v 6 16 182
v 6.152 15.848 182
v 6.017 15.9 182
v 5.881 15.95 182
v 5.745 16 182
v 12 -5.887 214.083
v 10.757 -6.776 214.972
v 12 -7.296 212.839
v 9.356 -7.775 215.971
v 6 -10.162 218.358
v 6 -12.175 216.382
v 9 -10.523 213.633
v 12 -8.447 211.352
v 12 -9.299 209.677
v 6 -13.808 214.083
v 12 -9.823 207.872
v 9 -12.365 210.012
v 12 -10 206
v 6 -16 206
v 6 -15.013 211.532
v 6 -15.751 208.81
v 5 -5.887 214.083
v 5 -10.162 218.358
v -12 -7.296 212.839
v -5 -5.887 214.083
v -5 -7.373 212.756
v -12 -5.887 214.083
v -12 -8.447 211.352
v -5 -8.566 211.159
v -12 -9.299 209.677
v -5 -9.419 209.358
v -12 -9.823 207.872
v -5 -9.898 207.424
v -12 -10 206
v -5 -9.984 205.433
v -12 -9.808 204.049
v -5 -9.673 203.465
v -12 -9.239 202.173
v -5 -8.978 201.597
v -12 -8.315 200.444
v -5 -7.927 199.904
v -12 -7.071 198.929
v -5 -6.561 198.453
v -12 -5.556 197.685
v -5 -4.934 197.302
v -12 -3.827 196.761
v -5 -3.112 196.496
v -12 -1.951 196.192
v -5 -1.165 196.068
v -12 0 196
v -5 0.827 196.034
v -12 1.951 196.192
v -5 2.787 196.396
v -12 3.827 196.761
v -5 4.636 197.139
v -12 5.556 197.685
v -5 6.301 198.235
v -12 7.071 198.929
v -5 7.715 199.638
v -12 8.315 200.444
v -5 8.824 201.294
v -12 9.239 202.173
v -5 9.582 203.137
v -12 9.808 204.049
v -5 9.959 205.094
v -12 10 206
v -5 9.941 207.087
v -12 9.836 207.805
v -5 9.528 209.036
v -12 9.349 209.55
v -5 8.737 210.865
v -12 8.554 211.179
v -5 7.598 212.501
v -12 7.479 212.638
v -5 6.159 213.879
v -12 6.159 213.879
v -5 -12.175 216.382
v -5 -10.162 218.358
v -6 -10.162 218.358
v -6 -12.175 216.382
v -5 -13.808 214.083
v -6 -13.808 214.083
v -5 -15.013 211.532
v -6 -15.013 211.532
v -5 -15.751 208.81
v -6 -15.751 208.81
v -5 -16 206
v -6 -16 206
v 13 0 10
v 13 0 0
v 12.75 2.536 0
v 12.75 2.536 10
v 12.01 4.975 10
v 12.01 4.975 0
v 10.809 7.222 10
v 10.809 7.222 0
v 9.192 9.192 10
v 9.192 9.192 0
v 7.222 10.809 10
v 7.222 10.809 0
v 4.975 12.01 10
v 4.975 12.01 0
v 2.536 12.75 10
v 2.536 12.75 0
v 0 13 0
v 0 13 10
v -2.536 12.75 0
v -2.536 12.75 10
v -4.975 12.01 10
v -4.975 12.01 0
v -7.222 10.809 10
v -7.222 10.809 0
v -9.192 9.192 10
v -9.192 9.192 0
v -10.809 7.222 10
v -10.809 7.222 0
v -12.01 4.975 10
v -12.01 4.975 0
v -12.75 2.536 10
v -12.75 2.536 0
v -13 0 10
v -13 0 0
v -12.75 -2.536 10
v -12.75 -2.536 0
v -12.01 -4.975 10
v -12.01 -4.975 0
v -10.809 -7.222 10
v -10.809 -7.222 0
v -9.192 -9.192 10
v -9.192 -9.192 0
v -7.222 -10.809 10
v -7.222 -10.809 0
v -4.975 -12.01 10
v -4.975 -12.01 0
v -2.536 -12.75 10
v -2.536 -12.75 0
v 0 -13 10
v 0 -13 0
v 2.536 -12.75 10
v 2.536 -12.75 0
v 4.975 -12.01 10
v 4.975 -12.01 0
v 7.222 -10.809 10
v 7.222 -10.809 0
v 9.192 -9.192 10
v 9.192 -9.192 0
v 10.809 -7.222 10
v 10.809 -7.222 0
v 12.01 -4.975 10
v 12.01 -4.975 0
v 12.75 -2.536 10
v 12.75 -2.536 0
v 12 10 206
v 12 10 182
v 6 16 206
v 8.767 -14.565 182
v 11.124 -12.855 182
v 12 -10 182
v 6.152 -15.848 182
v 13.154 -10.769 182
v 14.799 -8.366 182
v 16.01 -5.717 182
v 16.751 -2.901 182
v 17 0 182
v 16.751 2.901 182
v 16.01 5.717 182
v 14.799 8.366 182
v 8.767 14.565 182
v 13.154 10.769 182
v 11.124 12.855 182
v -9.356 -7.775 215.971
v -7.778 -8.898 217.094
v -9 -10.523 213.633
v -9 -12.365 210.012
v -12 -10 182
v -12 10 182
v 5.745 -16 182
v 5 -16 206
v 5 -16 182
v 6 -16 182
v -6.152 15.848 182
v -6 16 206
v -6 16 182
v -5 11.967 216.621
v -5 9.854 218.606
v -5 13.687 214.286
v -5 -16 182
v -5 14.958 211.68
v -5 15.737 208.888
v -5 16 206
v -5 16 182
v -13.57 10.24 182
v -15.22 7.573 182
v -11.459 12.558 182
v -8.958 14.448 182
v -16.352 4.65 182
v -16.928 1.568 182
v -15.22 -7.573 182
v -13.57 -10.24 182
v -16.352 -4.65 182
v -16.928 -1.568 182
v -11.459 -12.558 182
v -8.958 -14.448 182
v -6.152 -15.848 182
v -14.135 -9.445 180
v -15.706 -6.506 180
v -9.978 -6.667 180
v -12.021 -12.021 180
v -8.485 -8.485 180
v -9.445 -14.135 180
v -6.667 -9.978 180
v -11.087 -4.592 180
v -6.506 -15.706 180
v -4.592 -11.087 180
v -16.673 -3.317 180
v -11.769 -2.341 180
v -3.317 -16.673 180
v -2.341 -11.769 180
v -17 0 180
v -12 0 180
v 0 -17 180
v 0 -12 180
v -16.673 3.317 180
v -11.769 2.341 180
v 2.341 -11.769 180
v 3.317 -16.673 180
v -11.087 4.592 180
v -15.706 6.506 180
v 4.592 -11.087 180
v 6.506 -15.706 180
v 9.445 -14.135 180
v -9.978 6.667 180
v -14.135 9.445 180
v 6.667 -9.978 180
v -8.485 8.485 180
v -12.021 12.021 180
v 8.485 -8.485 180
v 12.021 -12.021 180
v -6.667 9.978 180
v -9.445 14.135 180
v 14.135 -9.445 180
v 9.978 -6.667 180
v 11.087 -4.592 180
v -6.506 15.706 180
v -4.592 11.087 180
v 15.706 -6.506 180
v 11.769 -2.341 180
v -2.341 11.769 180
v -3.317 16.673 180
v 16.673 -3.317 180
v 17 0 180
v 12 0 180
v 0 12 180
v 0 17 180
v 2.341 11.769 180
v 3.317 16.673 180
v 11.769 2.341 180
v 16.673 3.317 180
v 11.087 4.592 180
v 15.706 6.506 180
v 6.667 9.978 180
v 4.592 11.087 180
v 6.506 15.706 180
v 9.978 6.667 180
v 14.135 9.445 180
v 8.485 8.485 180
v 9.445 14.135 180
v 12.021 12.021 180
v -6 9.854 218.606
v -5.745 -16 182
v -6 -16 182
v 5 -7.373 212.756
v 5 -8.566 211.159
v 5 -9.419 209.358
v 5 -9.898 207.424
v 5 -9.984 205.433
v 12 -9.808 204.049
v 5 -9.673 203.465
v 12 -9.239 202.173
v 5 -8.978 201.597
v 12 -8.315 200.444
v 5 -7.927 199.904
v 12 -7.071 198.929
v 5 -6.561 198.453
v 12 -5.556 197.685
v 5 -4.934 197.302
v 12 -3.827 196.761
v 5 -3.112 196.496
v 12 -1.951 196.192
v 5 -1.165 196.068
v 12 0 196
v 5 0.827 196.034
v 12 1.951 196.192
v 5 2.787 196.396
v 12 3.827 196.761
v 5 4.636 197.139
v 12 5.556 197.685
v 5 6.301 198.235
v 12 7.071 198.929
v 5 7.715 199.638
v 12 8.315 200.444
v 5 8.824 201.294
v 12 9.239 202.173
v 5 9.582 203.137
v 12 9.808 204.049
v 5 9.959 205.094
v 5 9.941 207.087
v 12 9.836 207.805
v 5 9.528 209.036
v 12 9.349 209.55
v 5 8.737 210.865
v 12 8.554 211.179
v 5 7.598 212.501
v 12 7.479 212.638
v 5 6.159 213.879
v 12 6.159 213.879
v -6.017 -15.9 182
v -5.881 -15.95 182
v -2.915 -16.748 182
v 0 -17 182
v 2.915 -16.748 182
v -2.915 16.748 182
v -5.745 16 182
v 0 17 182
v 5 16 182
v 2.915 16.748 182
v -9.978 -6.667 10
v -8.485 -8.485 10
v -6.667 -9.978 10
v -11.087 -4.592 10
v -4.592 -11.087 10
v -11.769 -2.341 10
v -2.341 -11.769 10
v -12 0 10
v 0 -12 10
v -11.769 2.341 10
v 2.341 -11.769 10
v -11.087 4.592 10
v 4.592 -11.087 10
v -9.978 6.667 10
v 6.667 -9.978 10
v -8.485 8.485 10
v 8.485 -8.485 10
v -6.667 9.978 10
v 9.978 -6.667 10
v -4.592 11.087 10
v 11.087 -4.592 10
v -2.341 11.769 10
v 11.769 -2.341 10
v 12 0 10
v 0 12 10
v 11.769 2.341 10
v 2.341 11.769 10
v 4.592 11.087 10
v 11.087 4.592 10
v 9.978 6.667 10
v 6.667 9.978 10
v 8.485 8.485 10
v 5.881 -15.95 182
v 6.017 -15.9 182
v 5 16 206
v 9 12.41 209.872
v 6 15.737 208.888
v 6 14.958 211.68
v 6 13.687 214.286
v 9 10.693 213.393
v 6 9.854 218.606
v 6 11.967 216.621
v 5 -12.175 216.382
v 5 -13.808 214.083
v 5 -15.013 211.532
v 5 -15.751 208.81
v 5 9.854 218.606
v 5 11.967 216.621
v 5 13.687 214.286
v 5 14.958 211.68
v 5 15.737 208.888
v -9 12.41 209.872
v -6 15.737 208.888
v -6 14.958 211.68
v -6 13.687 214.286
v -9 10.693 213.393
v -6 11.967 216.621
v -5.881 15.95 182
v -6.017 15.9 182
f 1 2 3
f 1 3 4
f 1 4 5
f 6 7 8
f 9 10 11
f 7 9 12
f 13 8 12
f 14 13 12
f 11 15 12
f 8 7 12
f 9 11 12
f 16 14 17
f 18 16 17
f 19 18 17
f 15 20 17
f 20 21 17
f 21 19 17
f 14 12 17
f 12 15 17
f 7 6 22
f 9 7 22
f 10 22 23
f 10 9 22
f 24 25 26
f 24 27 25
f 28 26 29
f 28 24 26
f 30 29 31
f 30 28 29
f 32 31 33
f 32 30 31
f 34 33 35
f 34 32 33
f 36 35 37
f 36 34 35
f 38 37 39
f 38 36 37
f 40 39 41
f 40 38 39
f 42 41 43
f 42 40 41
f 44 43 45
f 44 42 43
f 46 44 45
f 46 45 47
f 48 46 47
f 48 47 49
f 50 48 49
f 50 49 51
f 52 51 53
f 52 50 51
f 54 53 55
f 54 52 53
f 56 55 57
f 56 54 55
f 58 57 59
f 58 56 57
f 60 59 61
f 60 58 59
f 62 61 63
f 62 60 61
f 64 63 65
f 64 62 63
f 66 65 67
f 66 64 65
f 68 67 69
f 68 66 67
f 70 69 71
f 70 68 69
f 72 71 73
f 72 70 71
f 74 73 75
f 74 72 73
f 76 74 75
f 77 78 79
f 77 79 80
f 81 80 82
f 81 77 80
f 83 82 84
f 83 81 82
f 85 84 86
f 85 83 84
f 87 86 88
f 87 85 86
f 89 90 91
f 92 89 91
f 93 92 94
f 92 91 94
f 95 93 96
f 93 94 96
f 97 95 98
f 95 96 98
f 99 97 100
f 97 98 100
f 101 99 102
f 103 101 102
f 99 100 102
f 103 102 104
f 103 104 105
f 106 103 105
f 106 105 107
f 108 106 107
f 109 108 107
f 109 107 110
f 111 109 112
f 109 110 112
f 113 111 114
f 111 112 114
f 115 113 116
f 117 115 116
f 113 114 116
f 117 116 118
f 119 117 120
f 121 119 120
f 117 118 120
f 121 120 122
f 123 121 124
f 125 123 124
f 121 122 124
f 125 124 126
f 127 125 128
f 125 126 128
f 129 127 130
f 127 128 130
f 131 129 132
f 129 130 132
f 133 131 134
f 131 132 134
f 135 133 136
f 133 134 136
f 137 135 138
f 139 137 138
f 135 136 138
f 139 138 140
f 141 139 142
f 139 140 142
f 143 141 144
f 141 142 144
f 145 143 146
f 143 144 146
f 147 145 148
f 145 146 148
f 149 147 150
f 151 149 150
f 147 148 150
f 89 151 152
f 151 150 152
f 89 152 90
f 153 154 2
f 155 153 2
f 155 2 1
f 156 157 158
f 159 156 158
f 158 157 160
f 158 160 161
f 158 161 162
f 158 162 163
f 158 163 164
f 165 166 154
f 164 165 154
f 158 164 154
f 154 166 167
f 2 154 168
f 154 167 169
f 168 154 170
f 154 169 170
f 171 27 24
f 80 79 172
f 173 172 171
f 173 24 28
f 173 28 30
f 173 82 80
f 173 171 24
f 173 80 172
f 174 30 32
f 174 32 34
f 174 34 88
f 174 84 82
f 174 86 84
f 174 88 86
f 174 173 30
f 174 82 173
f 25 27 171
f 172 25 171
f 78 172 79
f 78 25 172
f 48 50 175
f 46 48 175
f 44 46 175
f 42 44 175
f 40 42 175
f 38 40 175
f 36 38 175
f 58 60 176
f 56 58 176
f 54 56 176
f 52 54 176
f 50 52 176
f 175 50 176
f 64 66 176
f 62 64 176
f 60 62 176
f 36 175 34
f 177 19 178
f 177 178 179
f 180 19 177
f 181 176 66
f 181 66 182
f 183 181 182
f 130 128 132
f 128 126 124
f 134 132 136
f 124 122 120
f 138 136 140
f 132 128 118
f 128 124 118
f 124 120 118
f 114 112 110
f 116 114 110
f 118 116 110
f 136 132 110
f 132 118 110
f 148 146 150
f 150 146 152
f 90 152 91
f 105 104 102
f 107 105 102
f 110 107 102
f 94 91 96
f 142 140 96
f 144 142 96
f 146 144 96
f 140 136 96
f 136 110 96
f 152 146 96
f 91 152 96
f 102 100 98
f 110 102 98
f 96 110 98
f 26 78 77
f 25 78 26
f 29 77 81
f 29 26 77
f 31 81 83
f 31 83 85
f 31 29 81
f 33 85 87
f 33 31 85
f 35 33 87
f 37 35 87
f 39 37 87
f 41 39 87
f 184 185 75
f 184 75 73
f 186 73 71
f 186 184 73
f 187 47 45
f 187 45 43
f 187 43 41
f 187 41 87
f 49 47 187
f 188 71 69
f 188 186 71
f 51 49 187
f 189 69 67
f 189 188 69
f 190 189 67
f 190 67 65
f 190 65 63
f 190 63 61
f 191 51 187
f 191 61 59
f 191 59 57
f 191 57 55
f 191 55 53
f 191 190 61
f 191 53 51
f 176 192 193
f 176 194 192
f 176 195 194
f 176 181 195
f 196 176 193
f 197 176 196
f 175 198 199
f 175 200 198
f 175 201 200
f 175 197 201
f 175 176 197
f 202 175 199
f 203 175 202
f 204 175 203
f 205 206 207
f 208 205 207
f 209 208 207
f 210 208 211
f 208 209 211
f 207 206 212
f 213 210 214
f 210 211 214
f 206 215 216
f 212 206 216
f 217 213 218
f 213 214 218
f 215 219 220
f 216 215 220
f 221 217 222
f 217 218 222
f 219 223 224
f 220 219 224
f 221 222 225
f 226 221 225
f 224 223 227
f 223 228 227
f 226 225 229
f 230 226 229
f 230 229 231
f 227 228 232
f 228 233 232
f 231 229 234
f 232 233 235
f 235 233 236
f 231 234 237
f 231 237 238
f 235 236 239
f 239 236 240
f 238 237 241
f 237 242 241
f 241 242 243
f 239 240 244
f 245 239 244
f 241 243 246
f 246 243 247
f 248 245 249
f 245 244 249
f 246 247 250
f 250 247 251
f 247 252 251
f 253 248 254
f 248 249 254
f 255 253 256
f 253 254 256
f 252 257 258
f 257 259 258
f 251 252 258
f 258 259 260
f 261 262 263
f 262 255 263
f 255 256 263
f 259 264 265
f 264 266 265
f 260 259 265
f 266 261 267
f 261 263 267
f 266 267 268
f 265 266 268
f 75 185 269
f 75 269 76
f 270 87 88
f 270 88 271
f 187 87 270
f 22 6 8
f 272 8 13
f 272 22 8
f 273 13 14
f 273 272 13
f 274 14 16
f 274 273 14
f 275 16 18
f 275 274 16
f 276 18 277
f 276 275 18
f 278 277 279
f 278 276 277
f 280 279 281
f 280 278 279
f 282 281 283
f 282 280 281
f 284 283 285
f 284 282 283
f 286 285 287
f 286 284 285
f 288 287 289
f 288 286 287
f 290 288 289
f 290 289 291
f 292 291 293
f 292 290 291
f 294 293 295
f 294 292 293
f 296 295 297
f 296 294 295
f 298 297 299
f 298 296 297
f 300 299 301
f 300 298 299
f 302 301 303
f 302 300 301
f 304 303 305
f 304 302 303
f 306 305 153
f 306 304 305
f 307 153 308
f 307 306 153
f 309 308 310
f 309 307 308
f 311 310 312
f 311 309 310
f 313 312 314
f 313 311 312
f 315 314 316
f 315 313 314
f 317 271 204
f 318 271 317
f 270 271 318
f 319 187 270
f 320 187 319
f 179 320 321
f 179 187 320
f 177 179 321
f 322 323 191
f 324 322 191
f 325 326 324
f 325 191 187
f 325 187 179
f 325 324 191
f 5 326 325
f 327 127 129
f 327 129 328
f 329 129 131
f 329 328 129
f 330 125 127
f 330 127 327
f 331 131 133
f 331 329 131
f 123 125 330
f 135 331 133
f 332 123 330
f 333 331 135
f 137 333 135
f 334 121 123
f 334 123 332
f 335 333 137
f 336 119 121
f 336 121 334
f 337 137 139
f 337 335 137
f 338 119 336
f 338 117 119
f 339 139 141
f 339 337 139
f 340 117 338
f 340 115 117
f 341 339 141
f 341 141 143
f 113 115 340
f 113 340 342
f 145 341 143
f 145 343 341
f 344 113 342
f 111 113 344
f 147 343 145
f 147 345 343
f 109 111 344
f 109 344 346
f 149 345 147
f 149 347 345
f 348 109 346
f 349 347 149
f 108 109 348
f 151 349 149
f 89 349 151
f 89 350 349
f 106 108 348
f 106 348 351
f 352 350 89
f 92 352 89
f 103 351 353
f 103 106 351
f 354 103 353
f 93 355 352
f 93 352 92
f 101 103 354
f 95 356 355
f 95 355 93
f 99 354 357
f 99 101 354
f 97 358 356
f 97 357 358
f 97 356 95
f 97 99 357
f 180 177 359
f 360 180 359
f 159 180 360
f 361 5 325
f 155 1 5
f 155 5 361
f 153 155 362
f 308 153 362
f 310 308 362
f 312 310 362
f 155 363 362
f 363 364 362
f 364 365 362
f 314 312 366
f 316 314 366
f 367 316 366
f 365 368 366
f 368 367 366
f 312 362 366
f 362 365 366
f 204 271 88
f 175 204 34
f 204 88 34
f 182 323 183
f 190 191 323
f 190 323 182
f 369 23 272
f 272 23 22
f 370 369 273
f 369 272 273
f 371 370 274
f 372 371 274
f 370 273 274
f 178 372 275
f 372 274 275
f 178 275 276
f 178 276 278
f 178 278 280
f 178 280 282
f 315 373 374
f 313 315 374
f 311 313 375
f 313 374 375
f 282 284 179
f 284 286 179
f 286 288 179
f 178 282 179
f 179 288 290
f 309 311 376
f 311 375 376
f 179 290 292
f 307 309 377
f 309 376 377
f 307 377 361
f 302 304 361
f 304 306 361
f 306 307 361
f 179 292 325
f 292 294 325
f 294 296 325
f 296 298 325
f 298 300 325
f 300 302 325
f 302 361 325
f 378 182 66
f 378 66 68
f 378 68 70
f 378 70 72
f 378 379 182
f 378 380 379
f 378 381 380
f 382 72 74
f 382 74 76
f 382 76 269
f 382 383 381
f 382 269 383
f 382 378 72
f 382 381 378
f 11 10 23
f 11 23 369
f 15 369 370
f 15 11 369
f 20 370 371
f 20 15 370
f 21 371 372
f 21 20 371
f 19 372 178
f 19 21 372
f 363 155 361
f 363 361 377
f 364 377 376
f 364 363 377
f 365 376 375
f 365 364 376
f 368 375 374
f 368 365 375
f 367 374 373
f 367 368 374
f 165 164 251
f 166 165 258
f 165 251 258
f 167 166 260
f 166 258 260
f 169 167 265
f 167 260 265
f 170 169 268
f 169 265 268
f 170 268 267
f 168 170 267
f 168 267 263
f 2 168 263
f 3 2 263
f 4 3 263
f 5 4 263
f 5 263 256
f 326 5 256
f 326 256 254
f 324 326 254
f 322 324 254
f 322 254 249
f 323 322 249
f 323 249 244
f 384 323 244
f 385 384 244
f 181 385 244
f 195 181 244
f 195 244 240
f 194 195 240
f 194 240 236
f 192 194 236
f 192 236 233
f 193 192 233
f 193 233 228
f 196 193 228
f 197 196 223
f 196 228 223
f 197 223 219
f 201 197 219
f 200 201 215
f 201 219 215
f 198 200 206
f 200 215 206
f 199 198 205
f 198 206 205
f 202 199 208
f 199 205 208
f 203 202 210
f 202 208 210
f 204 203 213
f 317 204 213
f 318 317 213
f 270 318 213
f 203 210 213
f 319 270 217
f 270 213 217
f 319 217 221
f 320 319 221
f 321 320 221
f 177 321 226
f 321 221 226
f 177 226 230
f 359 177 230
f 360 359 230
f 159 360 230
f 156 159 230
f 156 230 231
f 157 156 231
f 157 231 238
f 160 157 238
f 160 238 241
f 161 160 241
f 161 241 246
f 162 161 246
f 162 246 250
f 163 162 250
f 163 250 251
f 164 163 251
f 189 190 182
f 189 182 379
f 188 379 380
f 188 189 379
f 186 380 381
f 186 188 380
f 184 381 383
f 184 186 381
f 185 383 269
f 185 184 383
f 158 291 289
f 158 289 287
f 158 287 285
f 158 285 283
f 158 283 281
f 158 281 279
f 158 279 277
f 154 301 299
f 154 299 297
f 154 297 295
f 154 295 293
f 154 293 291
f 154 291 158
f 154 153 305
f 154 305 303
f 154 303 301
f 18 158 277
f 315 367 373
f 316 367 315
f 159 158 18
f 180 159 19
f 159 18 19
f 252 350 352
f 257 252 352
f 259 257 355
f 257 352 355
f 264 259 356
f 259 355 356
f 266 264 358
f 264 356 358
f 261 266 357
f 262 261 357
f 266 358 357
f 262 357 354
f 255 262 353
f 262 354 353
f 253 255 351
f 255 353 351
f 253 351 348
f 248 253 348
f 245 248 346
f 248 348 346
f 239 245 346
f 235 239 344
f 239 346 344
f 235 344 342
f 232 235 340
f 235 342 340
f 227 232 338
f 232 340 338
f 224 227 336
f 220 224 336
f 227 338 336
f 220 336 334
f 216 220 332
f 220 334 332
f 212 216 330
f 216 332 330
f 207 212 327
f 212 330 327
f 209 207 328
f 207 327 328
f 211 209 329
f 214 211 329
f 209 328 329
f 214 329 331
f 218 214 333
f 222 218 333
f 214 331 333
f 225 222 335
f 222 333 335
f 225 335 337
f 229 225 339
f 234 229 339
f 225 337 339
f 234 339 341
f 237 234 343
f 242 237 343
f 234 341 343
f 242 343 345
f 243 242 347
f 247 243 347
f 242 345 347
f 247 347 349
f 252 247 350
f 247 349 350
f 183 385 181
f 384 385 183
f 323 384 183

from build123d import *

# Parameters (mm, degrees)
SKETCH1_R           = 13
SKETCH1_R_2         = 12
BOSS_EXTRUDE1_DEPTH = 10
SKETCH2_R           = 12
BOSS_EXTRUDE2_DEPTH = 170
SKETCH3_R           = 17
BOSS_EXTRUDE3_DEPTH = 2
SKETCH4_R           = 10
BOSS_EXTRUDE4_DEPTH = 12
CHAMFER1_SIZE       = 6
SKETCH5_W           = 10
SKETCH5_H           = 41
CUT_EXTRUDE1_DEPTH  = 20
CUT_EXTRUDE2_REACH  = 226.531


with BuildPart() as part:
    # Sketch1 → Boss-Extrude1 (new body)
    # profile 1 of 2: a face of its own
    with BuildSketch(Plane.XY):
        Circle(SKETCH1_R)
        Circle(SKETCH1_R_2, mode=Mode.SUBTRACT)
    # profile 2 of 2: a face of its own
    with BuildSketch(Plane.XY):
        Circle(SKETCH1_R_2)
    extrude(amount=BOSS_EXTRUDE1_DEPTH)

    # Sketch2 → Boss-Extrude2 (add)
    with BuildSketch(Plane.XY.offset(10)):
        Circle(SKETCH2_R)
    extrude(amount=BOSS_EXTRUDE2_DEPTH)

    # Sketch3 → Boss-Extrude3 (add)
    with BuildSketch(Plane.XY.offset(180)):
        Circle(SKETCH3_R)
    extrude(amount=BOSS_EXTRUDE3_DEPTH)

    # Sketch4 → Boss-Extrude4 (add, symmetric)
    with BuildSketch(Plane(origin=(0, 0, 0), x_dir=(0, 0, -1), z_dir=(1, 0, 0))):
        with BuildLine():
            Line((-182, 16), (-206, 16))
            ThreePointArc((-206, 16), (-222, 0), (-206, -16))
            Line((-206, -16), (-182, -16))
            Line((-182, -16), (-182, 16))
        make_face()
        with Locations((-206, 0)):
            Circle(SKETCH4_R, mode=Mode.SUBTRACT)
    extrude(amount=BOSS_EXTRUDE4_DEPTH, both=True)

    # Chamfer1
    # the kernel refuses this chamfer: 6 mm, written as the material it takes off along each edge
    with BuildSketch(Plane(origin=(12, 16, 182), x_dir=(0.027495876610586487, -0.9996219169112968, 0), z_dir=(0, 0, 1)), Plane(origin=(12, -16, 206), x_dir=(0.027495876610586487, 0.9996219169112968, 0), z_dir=(0, 0, -1)), Plane(origin=(-12, -16, 206), x_dir=(0.9996219169112968, -0.027495876610586202, 0), z_dir=(0, 0, -1))) as chamfer1_piece_1:
        Polygon((CHAMFER1_SIZE * 0.999621916911, -CHAMFER1_SIZE * 0.0274958766106), (-CHAMFER1_SIZE * 0.0274958766106, -CHAMFER1_SIZE * 0.999621916911), (0, 0), align=None)
    extrude(amount=24, mode=Mode.SUBTRACT)
    with BuildSketch(Plane(origin=(12, 0, 206), x_dir=(0, 1, 0), z_dir=(0, 0, -1))) as chamfer1_piece_2:
        Polygon((16 - CHAMFER1_SIZE, 0), (16, -CHAMFER1_SIZE), (16, 0), align=None)
    revolve(axis=Axis((12, 0, 206), (1, 0, 0)), revolution_arc=180, mode=Mode.SUBTRACT)
    with BuildSketch(Plane(origin=(-12, 16, 182), x_dir=(-0.027495876610586487, -0.9996219169112968, 0), z_dir=(0, 0, 1))) as chamfer1_piece_3:
        Polygon((CHAMFER1_SIZE * 0.999621916911, CHAMFER1_SIZE * 0.0274958766106), (-CHAMFER1_SIZE * 0.0274958766106, CHAMFER1_SIZE * 0.999621916911), (0, 0), align=None)
    extrude(amount=24, mode=Mode.SUBTRACT)
    with BuildSketch(Plane(origin=(-12, 0, 206), x_dir=(0, 1, 0), z_dir=(0, 0, -1))) as chamfer1_piece_4:
        Polygon((16 - CHAMFER1_SIZE, 0), (16, CHAMFER1_SIZE), (16, 0), align=None)
    revolve(axis=Axis((-12, 0, 206), (1, 0, 0)), revolution_arc=180, mode=Mode.SUBTRACT)

    # Sketch5 → Cut-Extrude1 (cut, symmetric)
    with BuildSketch(Plane(origin=(0, 0, 0), x_dir=(1, 0, 0), z_dir=(0, 1, 0))):
        with Locations((0, -202.5)):
            Rectangle(SKETCH5_W, SKETCH5_H)
    extrude(amount=CUT_EXTRUDE1_DEPTH, both=True, mode=Mode.SUBTRACT)

    # Cut-Extrude2: up to this face of the body (flat: up to its plane)
    cut_extrude2_end = Plane(part.part.faces().sort_by_distance((-12, 0, 190.227277531))[0])
    # Sketch6 → Cut-Extrude2 (cut, up to the picked face)
    with BuildSketch(Plane(origin=(12, 0, 0), x_dir=(0, 0, -1), z_dir=(1, 0, 0)), mode=Mode.PRIVATE) as cut_extrude2_sk1:
        with BuildLine():
            Line((-218.605812772, 9.853602608), (-213.878632982, 6.15850163))
            ThreePointArc((-213.878632982, 6.15850163), (-215.998555894, 0.169941286), (-214.083368787, -5.887202141))
            Line((-214.083368787, -5.887202141), (-218.35837697, -10.162210324))
            ThreePointArc((-218.35837697, -10.162210324), (-221.998777585, -0.197777146), (-218.605812772, 9.853602608))
        make_face()
    cut_extrude2_tool1 = split(extrude(cut_extrude2_sk1.sketch, amount=-CUT_EXTRUDE2_REACH, mode=Mode.PRIVATE), bisect_by=cut_extrude2_end, keep=Keep.BOTH, mode=Mode.PRIVATE)
    add(cut_extrude2_tool1.solids().sort_by(Axis((12, -0.027254, 218.293854), (-1, 0, 0)))[0], mode=Mode.SUBTRACT)


solid = part.part
